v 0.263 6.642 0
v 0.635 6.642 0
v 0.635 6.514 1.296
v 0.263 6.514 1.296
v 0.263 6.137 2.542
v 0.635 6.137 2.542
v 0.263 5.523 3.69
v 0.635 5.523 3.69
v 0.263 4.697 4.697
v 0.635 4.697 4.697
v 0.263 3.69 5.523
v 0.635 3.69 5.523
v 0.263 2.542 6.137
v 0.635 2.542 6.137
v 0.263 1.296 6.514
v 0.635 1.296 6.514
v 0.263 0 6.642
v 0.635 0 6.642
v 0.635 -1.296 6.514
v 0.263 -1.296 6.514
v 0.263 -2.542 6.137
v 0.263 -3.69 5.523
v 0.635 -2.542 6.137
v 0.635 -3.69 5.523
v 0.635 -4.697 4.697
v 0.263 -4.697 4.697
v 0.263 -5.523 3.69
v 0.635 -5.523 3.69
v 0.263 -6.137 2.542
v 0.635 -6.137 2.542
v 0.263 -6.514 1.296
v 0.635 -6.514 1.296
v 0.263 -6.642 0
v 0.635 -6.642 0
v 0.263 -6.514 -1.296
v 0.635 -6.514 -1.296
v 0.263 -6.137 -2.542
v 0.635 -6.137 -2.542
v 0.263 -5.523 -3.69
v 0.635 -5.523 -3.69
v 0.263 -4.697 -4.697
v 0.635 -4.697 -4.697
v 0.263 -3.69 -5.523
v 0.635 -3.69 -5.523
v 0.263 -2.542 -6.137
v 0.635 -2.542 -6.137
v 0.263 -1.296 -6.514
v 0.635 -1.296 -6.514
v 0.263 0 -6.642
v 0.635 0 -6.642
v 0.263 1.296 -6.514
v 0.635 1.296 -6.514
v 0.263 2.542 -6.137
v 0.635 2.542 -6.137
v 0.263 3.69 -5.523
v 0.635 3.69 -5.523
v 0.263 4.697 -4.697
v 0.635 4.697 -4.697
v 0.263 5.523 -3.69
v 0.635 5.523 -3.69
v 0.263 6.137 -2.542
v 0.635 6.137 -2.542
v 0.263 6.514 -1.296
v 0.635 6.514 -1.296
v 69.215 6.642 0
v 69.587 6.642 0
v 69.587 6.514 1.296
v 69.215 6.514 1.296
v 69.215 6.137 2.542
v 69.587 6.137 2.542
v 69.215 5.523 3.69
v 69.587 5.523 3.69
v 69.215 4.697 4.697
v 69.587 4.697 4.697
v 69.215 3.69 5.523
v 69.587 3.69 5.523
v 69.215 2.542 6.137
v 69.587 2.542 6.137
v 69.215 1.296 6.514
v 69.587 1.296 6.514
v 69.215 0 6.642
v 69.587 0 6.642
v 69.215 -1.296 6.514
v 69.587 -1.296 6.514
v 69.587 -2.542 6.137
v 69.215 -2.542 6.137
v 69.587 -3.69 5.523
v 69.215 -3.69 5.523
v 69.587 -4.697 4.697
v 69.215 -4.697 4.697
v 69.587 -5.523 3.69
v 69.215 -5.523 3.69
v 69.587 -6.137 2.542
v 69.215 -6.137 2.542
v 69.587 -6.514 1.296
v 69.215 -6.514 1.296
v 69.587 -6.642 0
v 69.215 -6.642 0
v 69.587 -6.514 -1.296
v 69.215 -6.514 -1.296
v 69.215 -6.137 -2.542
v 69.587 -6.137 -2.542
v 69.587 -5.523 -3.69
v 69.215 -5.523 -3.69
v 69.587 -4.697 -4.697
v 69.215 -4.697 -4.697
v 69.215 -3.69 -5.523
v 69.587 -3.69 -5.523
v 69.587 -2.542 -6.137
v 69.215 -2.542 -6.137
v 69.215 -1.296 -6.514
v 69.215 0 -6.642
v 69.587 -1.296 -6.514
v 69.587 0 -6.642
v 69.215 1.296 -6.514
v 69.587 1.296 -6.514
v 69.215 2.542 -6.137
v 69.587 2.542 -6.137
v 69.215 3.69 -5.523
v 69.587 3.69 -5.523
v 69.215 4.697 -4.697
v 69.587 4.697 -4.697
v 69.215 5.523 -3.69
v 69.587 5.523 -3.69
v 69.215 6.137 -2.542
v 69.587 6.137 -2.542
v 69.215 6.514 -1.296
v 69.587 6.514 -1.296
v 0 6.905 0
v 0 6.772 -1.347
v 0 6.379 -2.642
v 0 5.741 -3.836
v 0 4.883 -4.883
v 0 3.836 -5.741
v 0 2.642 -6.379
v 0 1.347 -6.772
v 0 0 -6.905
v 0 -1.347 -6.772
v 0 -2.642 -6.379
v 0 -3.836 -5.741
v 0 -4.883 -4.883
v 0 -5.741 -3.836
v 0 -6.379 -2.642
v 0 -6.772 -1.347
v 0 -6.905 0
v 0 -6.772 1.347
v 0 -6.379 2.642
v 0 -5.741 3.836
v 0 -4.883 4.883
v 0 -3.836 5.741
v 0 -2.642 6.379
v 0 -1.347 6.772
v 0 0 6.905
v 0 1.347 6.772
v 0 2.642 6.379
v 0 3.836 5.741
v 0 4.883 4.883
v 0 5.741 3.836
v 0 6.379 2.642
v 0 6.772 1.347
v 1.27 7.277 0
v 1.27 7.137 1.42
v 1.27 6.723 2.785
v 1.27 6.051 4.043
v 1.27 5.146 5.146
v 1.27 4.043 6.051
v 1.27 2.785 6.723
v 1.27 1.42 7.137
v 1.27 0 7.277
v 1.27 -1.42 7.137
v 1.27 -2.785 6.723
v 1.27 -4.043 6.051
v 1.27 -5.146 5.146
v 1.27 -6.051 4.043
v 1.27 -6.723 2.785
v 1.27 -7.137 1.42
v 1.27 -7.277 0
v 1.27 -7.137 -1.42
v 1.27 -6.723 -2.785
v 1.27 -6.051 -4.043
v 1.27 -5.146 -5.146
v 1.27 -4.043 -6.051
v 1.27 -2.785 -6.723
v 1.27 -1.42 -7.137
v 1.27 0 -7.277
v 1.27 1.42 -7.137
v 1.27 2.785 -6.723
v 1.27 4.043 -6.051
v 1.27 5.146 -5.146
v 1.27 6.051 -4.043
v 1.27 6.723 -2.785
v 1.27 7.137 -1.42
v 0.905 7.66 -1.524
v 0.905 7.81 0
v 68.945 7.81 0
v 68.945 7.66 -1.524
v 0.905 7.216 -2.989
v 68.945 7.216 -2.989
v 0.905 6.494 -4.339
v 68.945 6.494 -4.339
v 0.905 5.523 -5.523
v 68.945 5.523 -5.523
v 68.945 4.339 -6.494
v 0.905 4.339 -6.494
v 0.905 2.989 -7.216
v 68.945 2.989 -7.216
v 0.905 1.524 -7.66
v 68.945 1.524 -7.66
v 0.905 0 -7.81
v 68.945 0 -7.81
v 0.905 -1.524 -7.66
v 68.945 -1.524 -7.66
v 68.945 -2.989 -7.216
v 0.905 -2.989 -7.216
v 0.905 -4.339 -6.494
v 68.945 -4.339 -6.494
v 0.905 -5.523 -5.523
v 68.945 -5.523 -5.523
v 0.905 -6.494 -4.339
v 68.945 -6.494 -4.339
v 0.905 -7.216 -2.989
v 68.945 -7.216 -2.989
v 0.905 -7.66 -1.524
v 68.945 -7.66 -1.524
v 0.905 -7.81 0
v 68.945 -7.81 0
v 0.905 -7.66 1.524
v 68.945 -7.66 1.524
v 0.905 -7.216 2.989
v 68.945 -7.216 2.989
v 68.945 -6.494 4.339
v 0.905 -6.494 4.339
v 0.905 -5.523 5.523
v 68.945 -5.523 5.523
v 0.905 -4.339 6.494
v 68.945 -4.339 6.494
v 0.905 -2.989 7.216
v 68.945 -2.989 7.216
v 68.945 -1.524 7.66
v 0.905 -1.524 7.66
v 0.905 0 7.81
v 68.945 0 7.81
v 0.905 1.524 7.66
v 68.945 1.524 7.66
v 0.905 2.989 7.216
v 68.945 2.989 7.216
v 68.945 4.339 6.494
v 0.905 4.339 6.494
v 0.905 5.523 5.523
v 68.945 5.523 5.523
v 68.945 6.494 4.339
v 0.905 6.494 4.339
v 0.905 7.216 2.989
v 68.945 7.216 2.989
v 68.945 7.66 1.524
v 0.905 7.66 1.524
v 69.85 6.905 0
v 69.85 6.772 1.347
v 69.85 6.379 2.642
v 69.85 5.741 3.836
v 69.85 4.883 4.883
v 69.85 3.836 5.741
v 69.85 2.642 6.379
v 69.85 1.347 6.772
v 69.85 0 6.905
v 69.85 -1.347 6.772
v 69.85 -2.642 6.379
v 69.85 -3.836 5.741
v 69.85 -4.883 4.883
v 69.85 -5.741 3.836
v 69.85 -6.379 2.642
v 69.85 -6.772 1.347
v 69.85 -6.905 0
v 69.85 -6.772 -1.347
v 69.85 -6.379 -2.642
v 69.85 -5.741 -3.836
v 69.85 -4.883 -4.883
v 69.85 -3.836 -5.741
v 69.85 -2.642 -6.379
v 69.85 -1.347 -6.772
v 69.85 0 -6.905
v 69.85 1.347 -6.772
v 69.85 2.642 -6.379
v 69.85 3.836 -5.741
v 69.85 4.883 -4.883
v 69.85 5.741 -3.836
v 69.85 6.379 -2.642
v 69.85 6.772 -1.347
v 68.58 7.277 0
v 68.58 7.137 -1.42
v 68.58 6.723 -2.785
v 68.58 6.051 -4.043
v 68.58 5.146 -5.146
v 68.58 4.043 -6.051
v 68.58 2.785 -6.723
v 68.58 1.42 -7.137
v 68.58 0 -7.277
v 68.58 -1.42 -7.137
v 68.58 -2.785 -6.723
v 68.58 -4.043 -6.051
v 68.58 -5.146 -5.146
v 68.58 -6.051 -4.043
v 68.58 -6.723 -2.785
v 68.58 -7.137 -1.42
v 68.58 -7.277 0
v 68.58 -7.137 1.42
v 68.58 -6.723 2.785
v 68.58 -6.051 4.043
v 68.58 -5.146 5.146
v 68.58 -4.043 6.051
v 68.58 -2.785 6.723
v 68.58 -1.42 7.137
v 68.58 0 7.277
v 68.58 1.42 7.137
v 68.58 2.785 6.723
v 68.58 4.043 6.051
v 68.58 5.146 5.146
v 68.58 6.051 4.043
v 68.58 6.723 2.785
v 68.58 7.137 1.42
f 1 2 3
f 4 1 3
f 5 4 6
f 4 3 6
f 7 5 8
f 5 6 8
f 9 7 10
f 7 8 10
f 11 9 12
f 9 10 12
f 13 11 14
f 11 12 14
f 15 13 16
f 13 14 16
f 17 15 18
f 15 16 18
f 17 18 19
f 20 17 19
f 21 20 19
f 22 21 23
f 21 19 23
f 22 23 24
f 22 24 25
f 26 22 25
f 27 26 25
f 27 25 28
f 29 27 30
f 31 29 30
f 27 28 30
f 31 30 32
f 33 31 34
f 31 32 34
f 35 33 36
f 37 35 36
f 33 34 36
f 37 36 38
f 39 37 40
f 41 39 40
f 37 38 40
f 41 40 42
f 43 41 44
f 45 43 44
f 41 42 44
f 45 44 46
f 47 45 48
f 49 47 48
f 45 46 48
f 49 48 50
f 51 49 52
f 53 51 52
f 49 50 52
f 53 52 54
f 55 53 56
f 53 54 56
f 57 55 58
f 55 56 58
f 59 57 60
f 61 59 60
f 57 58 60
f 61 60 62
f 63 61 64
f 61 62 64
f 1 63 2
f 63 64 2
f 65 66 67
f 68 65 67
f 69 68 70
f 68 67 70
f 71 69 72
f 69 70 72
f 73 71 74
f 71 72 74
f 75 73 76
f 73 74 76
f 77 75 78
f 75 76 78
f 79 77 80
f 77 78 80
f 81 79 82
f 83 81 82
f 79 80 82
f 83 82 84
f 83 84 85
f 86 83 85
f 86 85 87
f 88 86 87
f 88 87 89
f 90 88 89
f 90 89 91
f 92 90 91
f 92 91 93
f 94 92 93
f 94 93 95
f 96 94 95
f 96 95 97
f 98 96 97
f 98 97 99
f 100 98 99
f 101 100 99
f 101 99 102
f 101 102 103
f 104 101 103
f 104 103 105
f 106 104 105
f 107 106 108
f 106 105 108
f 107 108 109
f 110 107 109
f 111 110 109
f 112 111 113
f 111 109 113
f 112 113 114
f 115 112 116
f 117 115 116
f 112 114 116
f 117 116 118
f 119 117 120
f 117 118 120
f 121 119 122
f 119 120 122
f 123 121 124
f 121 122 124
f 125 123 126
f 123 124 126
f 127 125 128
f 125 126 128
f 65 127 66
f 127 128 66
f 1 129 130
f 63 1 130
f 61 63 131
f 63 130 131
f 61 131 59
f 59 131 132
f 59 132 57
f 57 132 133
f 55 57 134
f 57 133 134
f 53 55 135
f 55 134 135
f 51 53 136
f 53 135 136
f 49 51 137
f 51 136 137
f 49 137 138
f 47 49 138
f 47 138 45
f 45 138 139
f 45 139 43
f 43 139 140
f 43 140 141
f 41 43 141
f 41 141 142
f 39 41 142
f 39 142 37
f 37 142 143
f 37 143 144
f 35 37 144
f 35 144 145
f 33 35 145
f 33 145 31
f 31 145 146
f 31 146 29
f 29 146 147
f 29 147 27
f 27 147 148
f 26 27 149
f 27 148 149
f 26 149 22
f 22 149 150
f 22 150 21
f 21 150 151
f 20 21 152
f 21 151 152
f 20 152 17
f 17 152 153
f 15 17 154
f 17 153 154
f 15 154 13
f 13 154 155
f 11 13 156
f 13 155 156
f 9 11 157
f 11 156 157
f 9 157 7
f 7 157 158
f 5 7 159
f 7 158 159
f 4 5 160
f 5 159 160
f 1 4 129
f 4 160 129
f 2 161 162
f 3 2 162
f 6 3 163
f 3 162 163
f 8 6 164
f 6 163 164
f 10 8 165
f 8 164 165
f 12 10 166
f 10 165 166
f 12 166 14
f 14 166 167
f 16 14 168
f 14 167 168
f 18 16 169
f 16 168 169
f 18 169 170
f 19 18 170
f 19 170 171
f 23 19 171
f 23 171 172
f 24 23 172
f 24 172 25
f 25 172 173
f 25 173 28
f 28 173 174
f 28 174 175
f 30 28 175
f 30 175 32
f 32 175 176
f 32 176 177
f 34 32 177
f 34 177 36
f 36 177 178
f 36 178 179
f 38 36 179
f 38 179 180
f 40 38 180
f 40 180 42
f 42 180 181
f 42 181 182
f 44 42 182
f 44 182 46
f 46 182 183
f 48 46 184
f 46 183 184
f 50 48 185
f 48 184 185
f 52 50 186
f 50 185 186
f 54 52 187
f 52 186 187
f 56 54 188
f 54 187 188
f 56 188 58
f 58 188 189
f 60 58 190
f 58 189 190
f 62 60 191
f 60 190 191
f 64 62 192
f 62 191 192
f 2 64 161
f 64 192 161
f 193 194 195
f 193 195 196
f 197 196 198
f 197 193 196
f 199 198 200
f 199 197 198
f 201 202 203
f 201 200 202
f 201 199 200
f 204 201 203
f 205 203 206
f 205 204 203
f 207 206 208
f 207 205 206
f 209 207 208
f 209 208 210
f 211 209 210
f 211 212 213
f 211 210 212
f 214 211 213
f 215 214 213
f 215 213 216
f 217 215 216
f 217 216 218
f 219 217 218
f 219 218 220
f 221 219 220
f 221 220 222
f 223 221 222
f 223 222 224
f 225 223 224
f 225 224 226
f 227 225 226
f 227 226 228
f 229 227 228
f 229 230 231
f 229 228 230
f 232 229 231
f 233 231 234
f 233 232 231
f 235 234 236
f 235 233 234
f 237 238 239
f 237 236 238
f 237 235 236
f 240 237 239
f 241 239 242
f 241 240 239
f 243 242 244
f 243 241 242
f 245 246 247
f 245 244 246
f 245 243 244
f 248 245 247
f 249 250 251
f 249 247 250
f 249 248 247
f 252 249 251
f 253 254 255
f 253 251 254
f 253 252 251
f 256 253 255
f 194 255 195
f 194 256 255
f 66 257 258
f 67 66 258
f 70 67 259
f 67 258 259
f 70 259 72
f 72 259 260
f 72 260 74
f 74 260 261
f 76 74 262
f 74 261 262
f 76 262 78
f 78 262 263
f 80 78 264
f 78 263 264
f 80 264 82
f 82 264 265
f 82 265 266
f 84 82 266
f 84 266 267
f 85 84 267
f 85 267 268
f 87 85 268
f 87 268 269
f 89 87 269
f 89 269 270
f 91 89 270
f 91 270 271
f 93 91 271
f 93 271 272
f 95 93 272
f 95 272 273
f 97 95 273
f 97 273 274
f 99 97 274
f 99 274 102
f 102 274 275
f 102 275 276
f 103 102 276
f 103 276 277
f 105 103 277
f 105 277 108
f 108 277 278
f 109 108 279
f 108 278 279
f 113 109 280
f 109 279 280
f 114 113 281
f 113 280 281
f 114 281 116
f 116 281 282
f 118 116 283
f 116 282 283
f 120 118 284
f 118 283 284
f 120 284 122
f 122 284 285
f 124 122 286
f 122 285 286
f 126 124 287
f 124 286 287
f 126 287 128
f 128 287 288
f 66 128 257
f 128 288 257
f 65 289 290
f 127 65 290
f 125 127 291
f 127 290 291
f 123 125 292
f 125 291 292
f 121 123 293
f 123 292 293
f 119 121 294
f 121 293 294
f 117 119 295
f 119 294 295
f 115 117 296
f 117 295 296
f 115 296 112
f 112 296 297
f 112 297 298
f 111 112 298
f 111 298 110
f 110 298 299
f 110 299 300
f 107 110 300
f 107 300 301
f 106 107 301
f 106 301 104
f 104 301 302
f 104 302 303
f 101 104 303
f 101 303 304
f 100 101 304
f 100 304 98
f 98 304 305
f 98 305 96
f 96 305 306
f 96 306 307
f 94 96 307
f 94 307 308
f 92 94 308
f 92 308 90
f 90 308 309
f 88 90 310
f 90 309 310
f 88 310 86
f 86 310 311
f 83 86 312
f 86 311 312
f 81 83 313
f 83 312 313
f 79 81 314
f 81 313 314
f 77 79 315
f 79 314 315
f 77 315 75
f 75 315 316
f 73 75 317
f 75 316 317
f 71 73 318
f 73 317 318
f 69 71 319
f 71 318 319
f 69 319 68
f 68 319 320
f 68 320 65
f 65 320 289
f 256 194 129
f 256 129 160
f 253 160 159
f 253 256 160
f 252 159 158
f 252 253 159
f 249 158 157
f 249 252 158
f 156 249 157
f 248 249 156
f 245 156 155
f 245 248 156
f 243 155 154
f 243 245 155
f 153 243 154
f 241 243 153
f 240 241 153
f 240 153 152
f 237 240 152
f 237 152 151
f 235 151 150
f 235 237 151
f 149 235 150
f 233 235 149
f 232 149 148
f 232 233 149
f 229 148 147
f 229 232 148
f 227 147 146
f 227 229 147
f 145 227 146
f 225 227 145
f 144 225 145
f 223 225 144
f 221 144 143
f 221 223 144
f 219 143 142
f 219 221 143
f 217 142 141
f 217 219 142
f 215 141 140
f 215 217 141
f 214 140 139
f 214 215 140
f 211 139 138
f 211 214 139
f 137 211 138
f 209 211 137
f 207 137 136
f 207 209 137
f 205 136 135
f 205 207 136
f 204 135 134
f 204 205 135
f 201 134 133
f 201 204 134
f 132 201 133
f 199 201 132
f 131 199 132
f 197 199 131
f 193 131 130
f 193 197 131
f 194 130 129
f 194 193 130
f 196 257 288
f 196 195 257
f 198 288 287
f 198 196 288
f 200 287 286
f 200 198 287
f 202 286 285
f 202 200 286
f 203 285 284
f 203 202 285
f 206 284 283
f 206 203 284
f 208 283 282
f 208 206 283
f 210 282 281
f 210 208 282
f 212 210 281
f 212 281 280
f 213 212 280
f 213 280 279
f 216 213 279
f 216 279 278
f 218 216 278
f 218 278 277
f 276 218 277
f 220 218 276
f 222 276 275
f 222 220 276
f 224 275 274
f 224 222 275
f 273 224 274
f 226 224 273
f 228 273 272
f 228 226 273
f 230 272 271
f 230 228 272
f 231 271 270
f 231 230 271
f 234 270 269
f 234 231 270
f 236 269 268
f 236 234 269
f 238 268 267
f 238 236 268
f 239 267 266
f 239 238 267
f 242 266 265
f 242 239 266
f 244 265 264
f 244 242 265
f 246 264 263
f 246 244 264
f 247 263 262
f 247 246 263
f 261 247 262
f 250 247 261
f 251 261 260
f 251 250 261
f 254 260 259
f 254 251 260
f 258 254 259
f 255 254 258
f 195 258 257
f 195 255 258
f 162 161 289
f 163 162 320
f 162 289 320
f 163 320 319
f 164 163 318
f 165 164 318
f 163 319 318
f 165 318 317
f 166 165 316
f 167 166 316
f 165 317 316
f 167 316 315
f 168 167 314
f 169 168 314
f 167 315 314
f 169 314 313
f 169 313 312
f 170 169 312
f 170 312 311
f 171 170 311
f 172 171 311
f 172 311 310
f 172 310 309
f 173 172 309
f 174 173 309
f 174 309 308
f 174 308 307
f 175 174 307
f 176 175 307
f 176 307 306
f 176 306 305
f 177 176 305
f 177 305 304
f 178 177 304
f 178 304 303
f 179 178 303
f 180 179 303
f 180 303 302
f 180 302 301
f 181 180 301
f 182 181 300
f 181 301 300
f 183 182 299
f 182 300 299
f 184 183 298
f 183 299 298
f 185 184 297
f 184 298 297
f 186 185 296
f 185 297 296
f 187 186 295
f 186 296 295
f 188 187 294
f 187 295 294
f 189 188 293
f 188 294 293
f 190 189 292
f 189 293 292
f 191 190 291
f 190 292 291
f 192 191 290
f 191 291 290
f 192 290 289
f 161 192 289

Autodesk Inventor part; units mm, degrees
sketch "Sketch_5" plane through (0, 0, 0) normal (0, 0, 1) x (1, 0, 0)
  line L0 (69.85, 0) -> (-69.85, 0)
  line L1 (0, 6.9051) -> (0.263, 6.6421)
  line L2 (0.263, 6.6421) -> (0.635, 6.6421)
  line L3 (0.635, 6.6421) -> (1.27, 7.2771)
  line L4 (1.27, 7.2771) -> (68.58, 7.2771)
  line L5 (68.58, 7.2771) -> (69.215, 6.6421)
  line L6 (69.215, 6.6421) -> (69.587, 6.6421)
  line L7 (69.587, 6.6421) -> (69.85, 6.9051)
  line L8 (69.85, 6.9051) -> (68.9446, 7.8105)
  line L9 (68.9446, 7.8105) -> (0.9054, 7.8105)
  line L10 (0.9054, 7.8105) -> (0, 6.9051)
revolve "Revolution1" add sketch "Sketch_5" angle 360 about axis through (69.85, 0, 0) along (1, 0, 0)
ref_plane "o1_XY" through (0, -7.8105, 0) normal (1, 0, 0) x (0, 0, -1)
ref_plane "o1_YZ" through (0, -7.8105, 0) normal (0, 0, -1) x (0, 1, 0)
ref_plane "o1_ZX" through (0, -7.8105, 0) normal (0, 1, 0) x (1, 0, 0)
ref_plane "o2_XY" through (0, 7.8105, 0) normal (1, 0, 0) x (0, 0, -1)
ref_plane "o2_YZ" through (0, 7.8105, 0) normal (0, 0, -1) x (0, 1, 0)
ref_plane "o2_ZX" through (0, 7.8105, 0) normal (0, 1, 0) x (1, 0, 0)
ref_plane "t1_XY" through (34.925, 7.8105, 0) normal (1, 0, 0) x (0, 0, -1)
ref_plane "t1_YZ" through (34.925, 7.8105, 0) normal (0, 0, -1) x (0, 1, 0)
ref_plane "t1_ZX" through (34.925, 7.8105, 0) normal (0, 1, 0) x (1, 0, 0)
ref_plane "t2_XY" through (34.925, 0, -7.8105) normal (1, 0, 0) x (0, 0, -1)
ref_plane "t2_YZ" through (34.925, 0, -7.8105) normal (0, 0, -1) x (0, 1, 0)
ref_plane "t2_ZX" through (34.925, 0, -7.8105) normal (0, 1, 0) x (1, 0, 0)
ref_plane "t3_XY" through (34.925, -7.8105, 0) normal (1, 0, 0) x (0, 0, -1)
ref_plane "t3_YZ" through (34.925, -7.8105, 0) normal (0, 0, -1) x (0, 1, 0)
ref_plane "t3_ZX" through (34.925, -7.8105, 0) normal (0, 1, 0) x (1, 0, 0)
ref_plane "t4_XY" through (34.925, 0, 7.8105) normal (1, 0, 0) x (0, 0, -1)
ref_plane "t4_YZ" through (34.925, 0, 7.8105) normal (0, 0, -1) x (0, 1, 0)
ref_plane "t4_ZX" through (34.925, 0, 7.8105) normal (0, 1, 0) x (1, 0, 0)
ref_plane "tube1_XY" through (1.27, 0, 0) normal (1, 0, 0) x (0, 0, -1)
ref_plane "tube1_YZ" through (1.27, 0, 0) normal (0, 0, -1) x (0, 1, 0)
ref_plane "tube1_ZX" through (1.27, 0, 0) normal (0, 1, 0) x (1, 0, 0)
ref_plane "tube2_XY" through (68.58, 0, 0) normal (1, 0, 0) x (0, 0, -1)
ref_plane "tube2_YZ" through (68.58, 0, 0) normal (0, 0, -1) x (0, 1, 0)
ref_plane "tube2_ZX" through (68.58, 0, 0) normal (0, 1, 0) x (1, 0, 0)
properties part number "D-7516-2.75"
